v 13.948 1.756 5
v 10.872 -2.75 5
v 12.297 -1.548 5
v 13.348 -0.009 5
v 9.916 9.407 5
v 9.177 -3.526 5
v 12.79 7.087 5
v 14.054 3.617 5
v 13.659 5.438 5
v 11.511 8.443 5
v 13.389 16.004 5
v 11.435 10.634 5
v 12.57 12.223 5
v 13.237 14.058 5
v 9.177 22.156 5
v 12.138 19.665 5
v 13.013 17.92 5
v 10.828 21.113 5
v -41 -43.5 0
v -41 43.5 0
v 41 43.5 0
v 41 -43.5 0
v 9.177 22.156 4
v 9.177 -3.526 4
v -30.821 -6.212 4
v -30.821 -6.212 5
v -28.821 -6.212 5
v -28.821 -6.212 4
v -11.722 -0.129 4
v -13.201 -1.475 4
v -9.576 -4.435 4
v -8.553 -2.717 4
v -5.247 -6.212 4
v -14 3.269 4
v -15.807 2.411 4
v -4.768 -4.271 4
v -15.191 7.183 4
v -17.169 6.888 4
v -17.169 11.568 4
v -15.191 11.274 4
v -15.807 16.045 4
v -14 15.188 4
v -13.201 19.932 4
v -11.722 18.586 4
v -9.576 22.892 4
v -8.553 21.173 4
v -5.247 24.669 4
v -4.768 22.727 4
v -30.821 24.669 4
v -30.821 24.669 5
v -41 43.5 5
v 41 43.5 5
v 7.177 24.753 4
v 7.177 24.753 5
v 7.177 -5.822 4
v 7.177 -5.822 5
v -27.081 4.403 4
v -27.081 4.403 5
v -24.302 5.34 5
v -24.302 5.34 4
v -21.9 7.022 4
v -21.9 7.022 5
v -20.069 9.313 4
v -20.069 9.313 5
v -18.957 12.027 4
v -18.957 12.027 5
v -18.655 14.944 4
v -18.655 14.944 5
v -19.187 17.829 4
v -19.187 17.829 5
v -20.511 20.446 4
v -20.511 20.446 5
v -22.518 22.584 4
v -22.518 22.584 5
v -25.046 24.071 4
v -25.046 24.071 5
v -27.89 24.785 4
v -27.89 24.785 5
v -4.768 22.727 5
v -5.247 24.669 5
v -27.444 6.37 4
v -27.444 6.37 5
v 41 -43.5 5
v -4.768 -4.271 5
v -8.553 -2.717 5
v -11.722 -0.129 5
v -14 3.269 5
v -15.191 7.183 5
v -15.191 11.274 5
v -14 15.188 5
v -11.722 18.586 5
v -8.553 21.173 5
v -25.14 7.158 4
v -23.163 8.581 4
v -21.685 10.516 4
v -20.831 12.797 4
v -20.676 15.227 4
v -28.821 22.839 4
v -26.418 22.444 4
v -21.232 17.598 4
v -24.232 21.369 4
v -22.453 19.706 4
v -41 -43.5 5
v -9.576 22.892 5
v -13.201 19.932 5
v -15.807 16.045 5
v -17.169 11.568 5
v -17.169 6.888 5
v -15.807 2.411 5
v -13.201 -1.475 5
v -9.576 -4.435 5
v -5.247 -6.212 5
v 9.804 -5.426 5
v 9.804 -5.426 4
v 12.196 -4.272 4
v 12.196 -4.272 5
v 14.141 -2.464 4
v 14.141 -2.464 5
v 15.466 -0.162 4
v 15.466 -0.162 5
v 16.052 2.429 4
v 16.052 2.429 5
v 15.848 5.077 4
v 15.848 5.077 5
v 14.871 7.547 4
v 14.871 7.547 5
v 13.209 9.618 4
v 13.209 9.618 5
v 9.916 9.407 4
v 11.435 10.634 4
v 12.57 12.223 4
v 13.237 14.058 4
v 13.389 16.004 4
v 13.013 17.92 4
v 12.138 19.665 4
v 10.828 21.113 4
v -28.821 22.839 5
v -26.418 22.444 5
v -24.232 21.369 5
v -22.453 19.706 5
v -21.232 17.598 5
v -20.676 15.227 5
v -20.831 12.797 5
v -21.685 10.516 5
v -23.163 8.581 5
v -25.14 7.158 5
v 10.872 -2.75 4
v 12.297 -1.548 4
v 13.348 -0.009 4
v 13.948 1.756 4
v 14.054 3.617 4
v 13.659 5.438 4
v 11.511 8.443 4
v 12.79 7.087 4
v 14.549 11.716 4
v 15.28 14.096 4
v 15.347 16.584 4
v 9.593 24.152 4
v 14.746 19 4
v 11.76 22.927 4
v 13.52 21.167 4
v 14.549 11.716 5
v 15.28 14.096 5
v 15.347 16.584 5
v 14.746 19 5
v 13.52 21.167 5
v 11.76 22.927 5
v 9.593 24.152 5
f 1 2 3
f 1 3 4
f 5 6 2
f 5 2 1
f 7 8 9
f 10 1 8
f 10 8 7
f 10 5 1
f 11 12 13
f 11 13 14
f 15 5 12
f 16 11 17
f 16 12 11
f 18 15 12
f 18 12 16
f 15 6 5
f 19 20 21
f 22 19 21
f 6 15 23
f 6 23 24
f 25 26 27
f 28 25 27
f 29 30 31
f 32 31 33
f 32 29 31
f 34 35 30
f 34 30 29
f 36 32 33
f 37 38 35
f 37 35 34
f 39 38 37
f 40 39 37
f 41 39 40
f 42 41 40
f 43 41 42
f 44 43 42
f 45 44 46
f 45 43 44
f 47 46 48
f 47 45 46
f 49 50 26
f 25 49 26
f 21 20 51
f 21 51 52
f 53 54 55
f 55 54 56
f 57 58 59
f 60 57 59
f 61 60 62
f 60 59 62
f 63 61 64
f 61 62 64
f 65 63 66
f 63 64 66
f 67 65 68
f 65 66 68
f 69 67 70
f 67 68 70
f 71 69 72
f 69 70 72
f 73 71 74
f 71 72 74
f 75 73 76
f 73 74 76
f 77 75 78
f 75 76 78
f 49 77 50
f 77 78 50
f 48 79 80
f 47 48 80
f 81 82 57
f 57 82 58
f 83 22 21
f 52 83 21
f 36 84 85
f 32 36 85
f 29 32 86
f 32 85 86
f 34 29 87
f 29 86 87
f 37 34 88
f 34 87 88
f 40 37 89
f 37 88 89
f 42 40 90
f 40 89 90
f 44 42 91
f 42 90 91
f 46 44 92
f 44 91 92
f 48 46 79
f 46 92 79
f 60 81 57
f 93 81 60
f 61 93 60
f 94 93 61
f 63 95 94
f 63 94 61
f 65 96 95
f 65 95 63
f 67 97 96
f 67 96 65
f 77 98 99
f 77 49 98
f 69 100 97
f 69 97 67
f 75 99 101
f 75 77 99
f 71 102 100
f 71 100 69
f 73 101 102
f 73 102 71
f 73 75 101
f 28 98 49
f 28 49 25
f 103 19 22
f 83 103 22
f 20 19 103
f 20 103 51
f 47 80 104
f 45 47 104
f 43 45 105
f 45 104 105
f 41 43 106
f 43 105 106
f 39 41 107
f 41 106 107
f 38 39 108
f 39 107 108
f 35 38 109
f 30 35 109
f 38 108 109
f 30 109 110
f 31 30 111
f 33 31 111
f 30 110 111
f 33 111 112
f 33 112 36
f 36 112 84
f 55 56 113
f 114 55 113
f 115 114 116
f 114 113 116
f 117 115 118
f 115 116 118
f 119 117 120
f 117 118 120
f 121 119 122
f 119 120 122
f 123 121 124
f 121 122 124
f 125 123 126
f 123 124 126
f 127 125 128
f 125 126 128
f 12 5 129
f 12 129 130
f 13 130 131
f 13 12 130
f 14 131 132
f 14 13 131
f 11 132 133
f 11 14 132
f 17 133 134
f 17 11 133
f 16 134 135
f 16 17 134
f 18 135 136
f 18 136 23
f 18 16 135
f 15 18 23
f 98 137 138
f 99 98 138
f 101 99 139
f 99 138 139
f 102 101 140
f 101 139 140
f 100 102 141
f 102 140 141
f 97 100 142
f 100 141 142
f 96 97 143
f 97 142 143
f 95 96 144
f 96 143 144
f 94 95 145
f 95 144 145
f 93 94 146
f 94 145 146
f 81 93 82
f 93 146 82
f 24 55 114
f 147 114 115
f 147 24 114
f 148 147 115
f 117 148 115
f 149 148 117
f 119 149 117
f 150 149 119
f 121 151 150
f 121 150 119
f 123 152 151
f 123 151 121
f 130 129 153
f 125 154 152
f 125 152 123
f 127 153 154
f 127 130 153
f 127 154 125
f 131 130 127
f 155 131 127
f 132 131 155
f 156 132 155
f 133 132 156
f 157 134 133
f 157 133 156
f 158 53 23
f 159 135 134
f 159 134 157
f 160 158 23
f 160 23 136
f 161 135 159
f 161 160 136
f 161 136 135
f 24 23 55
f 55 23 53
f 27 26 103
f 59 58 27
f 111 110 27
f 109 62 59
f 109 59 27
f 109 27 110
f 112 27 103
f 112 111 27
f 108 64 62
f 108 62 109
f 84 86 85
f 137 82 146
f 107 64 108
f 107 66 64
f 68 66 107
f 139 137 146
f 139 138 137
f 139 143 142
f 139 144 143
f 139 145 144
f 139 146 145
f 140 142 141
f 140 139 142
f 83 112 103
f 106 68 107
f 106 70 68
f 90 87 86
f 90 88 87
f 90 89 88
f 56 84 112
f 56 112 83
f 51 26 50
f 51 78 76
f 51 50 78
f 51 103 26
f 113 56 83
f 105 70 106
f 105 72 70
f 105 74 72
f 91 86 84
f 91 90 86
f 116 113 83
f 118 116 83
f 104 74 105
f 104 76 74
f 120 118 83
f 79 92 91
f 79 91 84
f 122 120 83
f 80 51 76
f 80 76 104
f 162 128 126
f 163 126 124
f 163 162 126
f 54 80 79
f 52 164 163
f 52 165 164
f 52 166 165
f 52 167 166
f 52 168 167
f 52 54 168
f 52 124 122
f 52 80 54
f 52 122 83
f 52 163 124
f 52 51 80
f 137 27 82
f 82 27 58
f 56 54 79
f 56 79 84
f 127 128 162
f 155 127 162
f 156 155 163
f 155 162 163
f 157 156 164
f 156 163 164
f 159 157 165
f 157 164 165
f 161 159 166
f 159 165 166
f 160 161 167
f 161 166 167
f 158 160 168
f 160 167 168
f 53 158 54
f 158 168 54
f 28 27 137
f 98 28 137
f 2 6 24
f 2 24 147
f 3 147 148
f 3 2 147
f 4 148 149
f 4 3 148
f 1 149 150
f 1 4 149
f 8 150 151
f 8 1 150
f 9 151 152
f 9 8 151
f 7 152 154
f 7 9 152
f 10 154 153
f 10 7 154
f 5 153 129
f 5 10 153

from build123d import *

# Parameters (mm, degrees)
ESQUISSE1_W             = 82
ESQUISSE1_H             = 87
BOSS_EXTRU_1_DEPTH      = 5
ENL_V_MAT_EXTRU_1_DEPTH = 1


with BuildPart() as part:
    # Esquisse1 → Boss.-Extru.1 (new body)
    with BuildSketch(Plane.XY):
        Rectangle(ESQUISSE1_W, ESQUISSE1_H)
    extrude(amount=BOSS_EXTRU_1_DEPTH)

    # Esquisse2 → Enlèv. mat.-Extru.1 (cut)
    # profile 1 of 3: a face of its own
    with BuildSketch(Plane.XY.offset(5)):
        with BuildLine():
            Line((-30.820713327, 24.668633563), (-30.820713327, -6.212394271))
            Line((-30.820713327, -6.212394271), (-28.820713327, -6.212394271))
            Line((-28.820713327, -6.212394271), (-28.820713327, 22.838674714))
            ThreePointArc((-28.820713327, 22.838674714), (-20.675920897, 15.227477844), (-27.444134647, 6.369755555))
            Line((-27.444134647, 6.369755555), (-27.081213863, 4.402959047))
            ThreePointArc((-27.081213863, 4.402959047), (-18.818126337, 16.405546037), (-30.820713327, 24.668633563))
        make_face()
    # profile 2 of 3: a face of its own
    with BuildSketch(Plane.XY.offset(5)):
        with BuildLine():
            Line((-5.247362152, -6.212394271), (-4.768401098, -4.270591936))
            ThreePointArc((-4.768401098, -4.270591936), (-15.342116904, 9.228119646), (-4.768401098, 22.726831228))
            Line((-4.768401098, 22.726831228), (-5.247362152, 24.668633563))
            ThreePointArc((-5.247362152, 24.668633563), (-17.342116904, 9.228119646), (-5.247362152, -6.212394271))
        make_face()
    # profile 3 of 3: a face of its own
    with BuildSketch(Plane.XY.offset(5)):
        with BuildLine():
            Line((7.177426391, 24.753119096), (7.177426391, -5.822234801))
            ThreePointArc((7.177426391, -5.822234801), (15.465789743, -0.161602052), (13.20887714, 9.618279116))
            ThreePointArc((13.20887714, 9.618279116), (14.745705745, 18.999957145), (7.177426391, 24.753119096))
        make_face()
        with BuildLine():
            Line((9.177426391, 22.155705275), (9.177426391, -3.525944184))
            ThreePointArc((9.177426391, -3.525944184), (14.064473769, 2.682629125), (9.916217396, 9.407328648))
            ThreePointArc((9.916217396, 9.407328648), (13.388733311, 16.004162532), (9.177426391, 22.155705275))
        make_face(mode=Mode.SUBTRACT)
    extrude(amount=-ENL_V_MAT_EXTRU_1_DEPTH, mode=Mode.SUBTRACT)


solid = part.part
